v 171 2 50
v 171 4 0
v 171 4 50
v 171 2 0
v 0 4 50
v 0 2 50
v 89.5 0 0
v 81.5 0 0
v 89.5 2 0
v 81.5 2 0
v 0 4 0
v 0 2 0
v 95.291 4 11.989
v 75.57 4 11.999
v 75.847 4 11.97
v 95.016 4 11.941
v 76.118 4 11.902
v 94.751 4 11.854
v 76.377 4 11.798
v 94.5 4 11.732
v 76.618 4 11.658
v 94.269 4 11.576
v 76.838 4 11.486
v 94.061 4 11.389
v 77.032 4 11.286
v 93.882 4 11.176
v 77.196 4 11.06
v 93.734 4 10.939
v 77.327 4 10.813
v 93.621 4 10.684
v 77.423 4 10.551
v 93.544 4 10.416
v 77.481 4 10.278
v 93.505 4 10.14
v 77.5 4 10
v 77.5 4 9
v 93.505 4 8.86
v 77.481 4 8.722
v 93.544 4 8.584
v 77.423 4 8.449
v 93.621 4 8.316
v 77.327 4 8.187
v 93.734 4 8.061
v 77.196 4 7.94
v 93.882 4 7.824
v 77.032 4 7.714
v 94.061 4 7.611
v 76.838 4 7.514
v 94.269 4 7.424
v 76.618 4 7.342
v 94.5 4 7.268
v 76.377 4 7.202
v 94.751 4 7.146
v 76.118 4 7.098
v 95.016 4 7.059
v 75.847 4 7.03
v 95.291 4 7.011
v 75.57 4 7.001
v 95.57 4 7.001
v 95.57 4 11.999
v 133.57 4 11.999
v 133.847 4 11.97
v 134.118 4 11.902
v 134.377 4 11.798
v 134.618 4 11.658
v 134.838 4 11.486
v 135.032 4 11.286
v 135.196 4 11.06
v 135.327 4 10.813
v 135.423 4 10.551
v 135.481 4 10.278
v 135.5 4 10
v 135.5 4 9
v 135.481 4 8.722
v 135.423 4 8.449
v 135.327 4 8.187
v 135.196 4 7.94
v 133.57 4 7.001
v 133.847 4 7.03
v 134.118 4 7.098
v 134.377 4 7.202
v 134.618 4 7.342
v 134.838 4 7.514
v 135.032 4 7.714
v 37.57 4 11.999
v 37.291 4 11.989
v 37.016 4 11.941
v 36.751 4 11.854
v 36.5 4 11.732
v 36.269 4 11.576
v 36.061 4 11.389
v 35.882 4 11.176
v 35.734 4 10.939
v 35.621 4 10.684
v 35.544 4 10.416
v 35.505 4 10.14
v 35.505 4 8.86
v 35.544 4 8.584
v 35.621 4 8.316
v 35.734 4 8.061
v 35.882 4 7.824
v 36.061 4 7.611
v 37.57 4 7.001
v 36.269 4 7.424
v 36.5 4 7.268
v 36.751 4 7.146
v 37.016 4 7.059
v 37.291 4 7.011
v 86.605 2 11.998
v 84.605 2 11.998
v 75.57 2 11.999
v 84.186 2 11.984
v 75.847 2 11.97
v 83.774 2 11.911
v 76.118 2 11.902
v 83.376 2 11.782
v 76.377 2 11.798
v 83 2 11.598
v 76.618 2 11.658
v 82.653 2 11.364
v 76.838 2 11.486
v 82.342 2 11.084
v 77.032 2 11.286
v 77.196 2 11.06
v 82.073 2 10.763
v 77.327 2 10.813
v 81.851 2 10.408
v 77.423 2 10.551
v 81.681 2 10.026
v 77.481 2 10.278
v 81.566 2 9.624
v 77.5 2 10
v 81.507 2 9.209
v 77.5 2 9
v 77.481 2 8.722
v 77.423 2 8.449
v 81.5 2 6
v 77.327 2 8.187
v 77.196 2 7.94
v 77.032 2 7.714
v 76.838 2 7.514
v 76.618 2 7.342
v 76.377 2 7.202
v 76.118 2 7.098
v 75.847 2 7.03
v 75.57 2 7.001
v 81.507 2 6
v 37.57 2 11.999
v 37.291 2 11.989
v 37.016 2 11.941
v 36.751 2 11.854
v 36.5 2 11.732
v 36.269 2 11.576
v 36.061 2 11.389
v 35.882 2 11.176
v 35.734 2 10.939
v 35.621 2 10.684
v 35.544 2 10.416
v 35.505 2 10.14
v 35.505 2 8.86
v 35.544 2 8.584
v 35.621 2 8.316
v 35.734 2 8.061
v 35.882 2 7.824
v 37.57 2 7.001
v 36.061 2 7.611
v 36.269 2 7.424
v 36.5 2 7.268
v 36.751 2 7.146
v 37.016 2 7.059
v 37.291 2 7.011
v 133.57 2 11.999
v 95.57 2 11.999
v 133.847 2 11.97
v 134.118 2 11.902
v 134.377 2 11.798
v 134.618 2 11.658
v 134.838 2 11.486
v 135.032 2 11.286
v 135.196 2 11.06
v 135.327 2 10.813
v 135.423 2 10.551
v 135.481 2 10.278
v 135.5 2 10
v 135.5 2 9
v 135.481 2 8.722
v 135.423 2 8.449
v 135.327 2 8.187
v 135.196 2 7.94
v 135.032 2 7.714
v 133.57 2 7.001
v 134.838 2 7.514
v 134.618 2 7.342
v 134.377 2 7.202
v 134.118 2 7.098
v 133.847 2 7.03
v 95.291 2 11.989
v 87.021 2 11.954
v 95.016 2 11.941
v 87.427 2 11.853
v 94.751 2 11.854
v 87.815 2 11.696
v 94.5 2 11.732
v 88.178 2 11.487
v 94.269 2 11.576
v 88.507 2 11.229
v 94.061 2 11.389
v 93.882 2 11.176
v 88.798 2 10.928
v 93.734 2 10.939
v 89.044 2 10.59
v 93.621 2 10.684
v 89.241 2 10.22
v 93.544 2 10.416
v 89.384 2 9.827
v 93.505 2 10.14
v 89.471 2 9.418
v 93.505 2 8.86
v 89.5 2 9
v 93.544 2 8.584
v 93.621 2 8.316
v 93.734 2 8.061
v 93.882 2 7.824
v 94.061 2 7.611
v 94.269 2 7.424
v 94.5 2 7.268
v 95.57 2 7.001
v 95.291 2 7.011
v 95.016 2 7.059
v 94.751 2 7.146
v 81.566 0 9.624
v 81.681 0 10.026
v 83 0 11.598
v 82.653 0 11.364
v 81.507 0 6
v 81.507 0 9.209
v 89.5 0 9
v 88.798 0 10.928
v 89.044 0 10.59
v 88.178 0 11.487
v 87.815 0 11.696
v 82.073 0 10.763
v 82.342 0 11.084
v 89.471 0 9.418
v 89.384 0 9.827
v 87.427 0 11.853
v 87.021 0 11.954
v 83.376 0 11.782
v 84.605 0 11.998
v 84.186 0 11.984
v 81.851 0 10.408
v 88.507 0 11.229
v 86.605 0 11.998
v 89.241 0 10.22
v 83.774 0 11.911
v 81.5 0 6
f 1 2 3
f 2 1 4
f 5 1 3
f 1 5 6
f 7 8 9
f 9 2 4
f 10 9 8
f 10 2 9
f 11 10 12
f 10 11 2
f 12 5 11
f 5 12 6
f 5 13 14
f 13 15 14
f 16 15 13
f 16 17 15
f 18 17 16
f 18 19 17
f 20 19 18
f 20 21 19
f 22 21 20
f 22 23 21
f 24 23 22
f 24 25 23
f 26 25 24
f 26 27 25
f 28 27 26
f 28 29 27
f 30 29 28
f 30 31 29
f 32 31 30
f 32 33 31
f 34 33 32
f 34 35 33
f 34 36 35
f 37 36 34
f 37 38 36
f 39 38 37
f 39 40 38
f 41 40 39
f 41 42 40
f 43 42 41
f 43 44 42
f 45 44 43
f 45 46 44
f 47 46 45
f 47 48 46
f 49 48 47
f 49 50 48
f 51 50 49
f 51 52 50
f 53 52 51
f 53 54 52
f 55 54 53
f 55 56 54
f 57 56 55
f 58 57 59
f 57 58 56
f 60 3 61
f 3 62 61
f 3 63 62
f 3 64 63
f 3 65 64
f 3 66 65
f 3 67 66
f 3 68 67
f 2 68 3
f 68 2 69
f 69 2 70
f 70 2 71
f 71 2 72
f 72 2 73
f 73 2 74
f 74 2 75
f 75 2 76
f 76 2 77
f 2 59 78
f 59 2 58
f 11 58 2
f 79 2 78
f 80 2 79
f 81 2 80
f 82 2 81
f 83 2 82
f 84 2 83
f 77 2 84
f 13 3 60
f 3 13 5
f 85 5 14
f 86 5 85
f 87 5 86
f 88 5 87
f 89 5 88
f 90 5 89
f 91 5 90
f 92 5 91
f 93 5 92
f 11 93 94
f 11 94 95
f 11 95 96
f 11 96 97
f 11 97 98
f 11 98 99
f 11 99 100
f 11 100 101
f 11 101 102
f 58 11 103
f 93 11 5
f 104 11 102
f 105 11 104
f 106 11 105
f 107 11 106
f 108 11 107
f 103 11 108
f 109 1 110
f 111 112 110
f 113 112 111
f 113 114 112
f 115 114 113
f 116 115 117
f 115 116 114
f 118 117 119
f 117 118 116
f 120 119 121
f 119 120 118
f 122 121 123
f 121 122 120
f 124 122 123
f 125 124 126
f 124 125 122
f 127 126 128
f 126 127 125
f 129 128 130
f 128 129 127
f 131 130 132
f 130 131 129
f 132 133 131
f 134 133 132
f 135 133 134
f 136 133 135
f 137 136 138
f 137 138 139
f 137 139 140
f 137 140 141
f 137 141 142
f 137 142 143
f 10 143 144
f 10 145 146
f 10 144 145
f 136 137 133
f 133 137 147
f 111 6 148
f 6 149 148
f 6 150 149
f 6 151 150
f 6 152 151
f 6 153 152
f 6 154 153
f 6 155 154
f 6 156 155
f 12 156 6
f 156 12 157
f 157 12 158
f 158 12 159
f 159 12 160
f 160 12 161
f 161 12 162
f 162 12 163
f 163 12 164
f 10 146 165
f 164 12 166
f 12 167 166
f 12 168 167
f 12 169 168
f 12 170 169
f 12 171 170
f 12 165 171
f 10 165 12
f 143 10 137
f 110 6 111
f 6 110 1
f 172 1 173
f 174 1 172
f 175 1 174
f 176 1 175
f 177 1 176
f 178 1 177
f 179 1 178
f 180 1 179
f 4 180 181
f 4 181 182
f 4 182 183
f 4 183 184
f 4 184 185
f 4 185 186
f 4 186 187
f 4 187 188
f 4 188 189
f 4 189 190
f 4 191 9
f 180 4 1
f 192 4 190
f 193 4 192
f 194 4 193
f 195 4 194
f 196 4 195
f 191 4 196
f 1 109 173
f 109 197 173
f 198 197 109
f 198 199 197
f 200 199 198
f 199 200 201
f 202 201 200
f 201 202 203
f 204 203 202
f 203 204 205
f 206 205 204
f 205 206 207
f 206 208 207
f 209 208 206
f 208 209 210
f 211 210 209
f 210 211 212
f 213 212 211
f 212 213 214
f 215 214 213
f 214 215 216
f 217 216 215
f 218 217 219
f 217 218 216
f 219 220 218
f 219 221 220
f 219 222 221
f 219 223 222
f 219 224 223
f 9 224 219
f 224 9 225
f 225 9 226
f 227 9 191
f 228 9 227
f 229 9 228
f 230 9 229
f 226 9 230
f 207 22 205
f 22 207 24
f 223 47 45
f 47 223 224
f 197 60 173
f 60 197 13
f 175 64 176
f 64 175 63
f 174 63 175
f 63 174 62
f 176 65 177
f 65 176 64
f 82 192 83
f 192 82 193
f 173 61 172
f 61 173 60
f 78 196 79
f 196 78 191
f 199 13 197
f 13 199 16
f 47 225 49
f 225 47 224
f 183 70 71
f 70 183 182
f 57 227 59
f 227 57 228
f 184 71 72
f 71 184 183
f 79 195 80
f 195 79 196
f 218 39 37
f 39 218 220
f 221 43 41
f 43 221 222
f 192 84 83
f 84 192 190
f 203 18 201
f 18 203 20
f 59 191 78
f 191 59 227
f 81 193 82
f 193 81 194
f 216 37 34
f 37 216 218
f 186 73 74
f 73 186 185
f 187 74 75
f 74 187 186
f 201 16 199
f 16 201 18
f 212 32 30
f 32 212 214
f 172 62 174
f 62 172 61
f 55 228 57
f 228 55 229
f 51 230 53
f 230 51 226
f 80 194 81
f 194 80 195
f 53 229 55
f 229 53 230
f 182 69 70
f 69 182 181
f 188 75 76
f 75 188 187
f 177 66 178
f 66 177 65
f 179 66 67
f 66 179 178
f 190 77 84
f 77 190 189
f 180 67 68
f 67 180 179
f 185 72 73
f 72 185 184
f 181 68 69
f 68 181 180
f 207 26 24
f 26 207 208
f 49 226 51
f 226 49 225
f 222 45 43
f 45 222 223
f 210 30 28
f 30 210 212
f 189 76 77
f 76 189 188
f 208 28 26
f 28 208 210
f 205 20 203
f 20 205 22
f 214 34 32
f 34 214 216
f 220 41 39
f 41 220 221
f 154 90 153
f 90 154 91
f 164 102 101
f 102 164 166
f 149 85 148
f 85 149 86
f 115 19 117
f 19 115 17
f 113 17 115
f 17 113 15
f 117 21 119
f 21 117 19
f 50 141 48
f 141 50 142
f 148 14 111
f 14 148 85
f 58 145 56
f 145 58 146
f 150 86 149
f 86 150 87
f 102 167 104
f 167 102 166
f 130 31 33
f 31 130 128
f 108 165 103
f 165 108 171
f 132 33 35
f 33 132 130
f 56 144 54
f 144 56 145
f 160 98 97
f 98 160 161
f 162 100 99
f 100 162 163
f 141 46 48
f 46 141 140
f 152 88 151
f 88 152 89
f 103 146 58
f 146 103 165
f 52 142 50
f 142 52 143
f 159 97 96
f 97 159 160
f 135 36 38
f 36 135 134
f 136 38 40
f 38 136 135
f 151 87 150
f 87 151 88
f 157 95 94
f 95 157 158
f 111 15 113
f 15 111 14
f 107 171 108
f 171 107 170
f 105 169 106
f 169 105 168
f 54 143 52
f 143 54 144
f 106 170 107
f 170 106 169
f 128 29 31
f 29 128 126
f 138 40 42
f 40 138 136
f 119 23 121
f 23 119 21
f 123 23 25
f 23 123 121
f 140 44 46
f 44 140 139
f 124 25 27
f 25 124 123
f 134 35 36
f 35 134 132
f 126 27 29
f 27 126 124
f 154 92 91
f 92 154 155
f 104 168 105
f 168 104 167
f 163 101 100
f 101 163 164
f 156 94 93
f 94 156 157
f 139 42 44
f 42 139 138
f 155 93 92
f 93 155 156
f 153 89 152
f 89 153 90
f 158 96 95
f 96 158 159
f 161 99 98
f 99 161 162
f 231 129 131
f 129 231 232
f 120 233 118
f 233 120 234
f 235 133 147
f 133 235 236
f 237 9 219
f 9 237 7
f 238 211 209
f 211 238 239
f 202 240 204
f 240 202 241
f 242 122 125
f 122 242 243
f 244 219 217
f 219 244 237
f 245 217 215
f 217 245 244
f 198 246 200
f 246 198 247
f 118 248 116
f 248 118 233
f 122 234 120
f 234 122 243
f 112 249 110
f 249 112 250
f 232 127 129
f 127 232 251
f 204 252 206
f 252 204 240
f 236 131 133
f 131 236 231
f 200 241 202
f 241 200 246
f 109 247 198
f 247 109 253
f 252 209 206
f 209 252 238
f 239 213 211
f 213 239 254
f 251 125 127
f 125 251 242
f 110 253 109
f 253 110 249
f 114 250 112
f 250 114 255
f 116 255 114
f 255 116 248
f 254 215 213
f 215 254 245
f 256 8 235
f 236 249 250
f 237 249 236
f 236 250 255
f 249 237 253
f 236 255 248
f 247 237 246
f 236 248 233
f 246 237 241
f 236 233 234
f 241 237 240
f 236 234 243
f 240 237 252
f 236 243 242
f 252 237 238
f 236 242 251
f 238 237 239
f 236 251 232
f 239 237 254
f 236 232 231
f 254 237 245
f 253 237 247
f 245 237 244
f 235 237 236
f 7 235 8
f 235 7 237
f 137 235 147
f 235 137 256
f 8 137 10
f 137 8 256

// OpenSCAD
// file: dockSlit.scad
include <./const.scad>

// @example
dockSlit();

module dockSlit() {

  r = 3;
  h = 1;

  translate([ r, h, r ])
  minkowski() {

    cube([ DOCK_SLIT_WIDTH - (r * 2), DOCK_SLIT_DEPTH - h, DOCK_SLIT_HEIGHT - (r * 2) ]);

    $fn = 45;
    rotate([ 90, 0, 0 ])
    cylinder(r = r, h = h);
  }

  cube([ DOCK_SLIT_WIDTH, DOCK_SLIT_DEPTH, DOCK_SLIT_HEIGHT - (r * 2) ]);

}
// file: const.scad
SWITCH_WIDTH = 171;
SWITCH_DEPTH = 14;
SWITCH_HEIGHT = 100;

DOCK_SLIT_WIDTH = 8;
DOCK_SLIT_DEPTH = 2;
DOCK_SLIT_HEIGHT = 12;

BACK_HOLE_WIDTH = 42;
BACK_HOLE_HEIGHT = 5;
HOLE_VERTICAL_POSITION = DOCK_SLIT_HEIGHT - BACK_HOLE_HEIGHT;
HOLE_DISTANCE_FROM_CENTER = 4 + DOCK_SLIT_WIDTH / 2;
// main file
include <./const.scad>

use <./dockSlit.scad>

// @example
back(2);

module back(
  backDepth
) {

  backWidth = SWITCH_WIDTH;
  backHeight = SWITCH_HEIGHT / 2;

  holeDepth = backDepth;

  translate([ 0, DOCK_SLIT_DEPTH, 0 ])
  difference() {

    cube([ backWidth, backDepth, backHeight ]);

    translate([ SWITCH_WIDTH / 2 + HOLE_DISTANCE_FROM_CENTER, -1, HOLE_VERTICAL_POSITION ])
    backHole(holeDepth + 2); // above -1, and here +2 to make sure we "traverse" the surface and correctly "remove everything"

    translate([ SWITCH_WIDTH / 2 - HOLE_DISTANCE_FROM_CENTER - BACK_HOLE_WIDTH, -1, HOLE_VERTICAL_POSITION ])
    backHole(holeDepth + 2); // ^ ditto

  }

  translate([ backWidth / 2 - DOCK_SLIT_WIDTH / 2, 0, 0 ])
  dockSlit();

}

module backHole(
  holeDepth
) {

  r = floor(BACK_HOLE_HEIGHT / 2);
  h = 1;
  translate([ r, h, r ])
  minkowski() {

    cube([ BACK_HOLE_WIDTH - (r * 2), holeDepth - h, BACK_HOLE_HEIGHT - (r * 2) ]);

    $fn = 45;
    rotate([ 90, 0, 0 ])
    cylinder(r = r, h = h);

  }

}
